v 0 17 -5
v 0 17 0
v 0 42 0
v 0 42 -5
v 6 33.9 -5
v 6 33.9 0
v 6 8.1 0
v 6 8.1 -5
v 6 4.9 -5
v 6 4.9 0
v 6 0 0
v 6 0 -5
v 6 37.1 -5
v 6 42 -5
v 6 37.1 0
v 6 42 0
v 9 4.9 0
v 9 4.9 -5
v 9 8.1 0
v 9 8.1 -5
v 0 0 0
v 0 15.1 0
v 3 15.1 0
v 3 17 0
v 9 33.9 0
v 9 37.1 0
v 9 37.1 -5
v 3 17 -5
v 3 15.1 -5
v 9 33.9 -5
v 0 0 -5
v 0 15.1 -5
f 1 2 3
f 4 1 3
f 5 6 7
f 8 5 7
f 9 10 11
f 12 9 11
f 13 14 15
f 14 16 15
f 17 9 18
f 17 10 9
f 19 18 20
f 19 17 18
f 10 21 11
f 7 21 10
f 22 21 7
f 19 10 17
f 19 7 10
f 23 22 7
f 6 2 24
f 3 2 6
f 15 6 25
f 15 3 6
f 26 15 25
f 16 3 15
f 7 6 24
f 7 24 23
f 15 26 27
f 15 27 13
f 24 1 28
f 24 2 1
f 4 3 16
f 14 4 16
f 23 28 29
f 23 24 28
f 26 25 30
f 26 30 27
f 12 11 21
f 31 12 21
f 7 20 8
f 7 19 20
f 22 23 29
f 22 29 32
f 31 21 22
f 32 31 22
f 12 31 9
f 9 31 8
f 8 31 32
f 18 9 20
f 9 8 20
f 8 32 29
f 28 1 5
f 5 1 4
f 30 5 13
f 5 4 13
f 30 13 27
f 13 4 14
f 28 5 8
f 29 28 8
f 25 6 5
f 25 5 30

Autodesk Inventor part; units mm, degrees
ref_plane "YZ Plane" through (0, 0, 0) normal (1, 0, 0) x (0, 1, 0)
ref_plane "XZ Plane" through (0, 0, 0) normal (0, 1, 0) x (-1, 0, 0)
ref_plane "XY Plane" through (0, 0, 0) normal (0, 0, 1) x (1, 0, 0)
sketch "Sketch1" plane through (0, 0, 0) normal (0, 0, 1) x (1, 0, 0)
  line L0 (0, 42) -> (6, 42)
  line L1 (6, 42) -> (6, 0)
  line L2 (6, 0) -> (0, 0)
  line L3 (0, 0) -> (0, 42)
  dimension "d0" = 6
  dimension "d1" = 42
extrude "Extrusion1" add sketch "Sketch1" against normal blind 5
sketch "Sketch4" plane through (0, 0, 0) normal (0, 0, 1) x (1, 0, 0)
  line L0 (0, 0) -> (0, 42) projected
  line L1 (0, 17) -> (3, 17)
  line L2 (3, 17) -> (3, 15.1)
  line L3 (3, 15.1) -> (0, 15.1)
  line L4 (0, 15.1) -> (0, 17)
  line L5 (6, 0) -> (0, 0) projected
  point P0 (0, 45)
  dimension "d12" = 1.9
  dimension "d13" = 3
  dimension "d18" = 17
extrude "Extrusion4" cut sketch "Sketch4" against normal blind 5
sketch "Sketch5" plane through (0, 0, 0) normal (0, 0, 1) x (1, 0, 0)
  line L0 (6, 42) -> (6, 0) projected
  line L1 (6, 0) -> (0, 0) projected
  line L2 (0, 42) -> (6, 42) projected
  line L3 (6, 42) -> (6, 0) projected
  line L4 (9, 8.1) -> (6, 8.1)
  line L5 (6, 8.1) -> (6, 4.9)
  line L6 (6, 4.9) -> (9, 4.9)
  line L7 (9, 4.9) -> (9, 8.1)
  line L8 (9, 8.1) -> (6, 4.9) construction
  line L9 (6, 8.1) -> (9, 4.9) construction
  line L10 (9, 37.1) -> (6, 37.1)
  line L11 (6, 37.1) -> (6, 33.9)
  line L12 (6, 33.9) -> (9, 33.9)
  line L13 (9, 33.9) -> (9, 37.1)
  line L14 (9, 37.1) -> (6, 33.9) construction
  line L15 (6, 37.1) -> (9, 33.9) construction
  line L16 (0, 42) -> (6, 0) construction
  line L17 (0, 0) -> (6, 42) construction
  point P0 (7.5, 6.5)
  point P1 (7.5, 35.5)
  point P2 (3, 21)
  dimension "d31" = 3
  dimension "d32" = 3.2
  dimension "d34" = 14.5
  dimension "d35" = 14.5
  dimension "d36" = 3.2
extrude "Extrusion5" add sketch "Sketch5" against normal blind 5
equation "\"d35\" = d34"
equation "\"d36\" = d32"
equation "\"kerf\" = 0.15"
properties part number "PCBSupport"
